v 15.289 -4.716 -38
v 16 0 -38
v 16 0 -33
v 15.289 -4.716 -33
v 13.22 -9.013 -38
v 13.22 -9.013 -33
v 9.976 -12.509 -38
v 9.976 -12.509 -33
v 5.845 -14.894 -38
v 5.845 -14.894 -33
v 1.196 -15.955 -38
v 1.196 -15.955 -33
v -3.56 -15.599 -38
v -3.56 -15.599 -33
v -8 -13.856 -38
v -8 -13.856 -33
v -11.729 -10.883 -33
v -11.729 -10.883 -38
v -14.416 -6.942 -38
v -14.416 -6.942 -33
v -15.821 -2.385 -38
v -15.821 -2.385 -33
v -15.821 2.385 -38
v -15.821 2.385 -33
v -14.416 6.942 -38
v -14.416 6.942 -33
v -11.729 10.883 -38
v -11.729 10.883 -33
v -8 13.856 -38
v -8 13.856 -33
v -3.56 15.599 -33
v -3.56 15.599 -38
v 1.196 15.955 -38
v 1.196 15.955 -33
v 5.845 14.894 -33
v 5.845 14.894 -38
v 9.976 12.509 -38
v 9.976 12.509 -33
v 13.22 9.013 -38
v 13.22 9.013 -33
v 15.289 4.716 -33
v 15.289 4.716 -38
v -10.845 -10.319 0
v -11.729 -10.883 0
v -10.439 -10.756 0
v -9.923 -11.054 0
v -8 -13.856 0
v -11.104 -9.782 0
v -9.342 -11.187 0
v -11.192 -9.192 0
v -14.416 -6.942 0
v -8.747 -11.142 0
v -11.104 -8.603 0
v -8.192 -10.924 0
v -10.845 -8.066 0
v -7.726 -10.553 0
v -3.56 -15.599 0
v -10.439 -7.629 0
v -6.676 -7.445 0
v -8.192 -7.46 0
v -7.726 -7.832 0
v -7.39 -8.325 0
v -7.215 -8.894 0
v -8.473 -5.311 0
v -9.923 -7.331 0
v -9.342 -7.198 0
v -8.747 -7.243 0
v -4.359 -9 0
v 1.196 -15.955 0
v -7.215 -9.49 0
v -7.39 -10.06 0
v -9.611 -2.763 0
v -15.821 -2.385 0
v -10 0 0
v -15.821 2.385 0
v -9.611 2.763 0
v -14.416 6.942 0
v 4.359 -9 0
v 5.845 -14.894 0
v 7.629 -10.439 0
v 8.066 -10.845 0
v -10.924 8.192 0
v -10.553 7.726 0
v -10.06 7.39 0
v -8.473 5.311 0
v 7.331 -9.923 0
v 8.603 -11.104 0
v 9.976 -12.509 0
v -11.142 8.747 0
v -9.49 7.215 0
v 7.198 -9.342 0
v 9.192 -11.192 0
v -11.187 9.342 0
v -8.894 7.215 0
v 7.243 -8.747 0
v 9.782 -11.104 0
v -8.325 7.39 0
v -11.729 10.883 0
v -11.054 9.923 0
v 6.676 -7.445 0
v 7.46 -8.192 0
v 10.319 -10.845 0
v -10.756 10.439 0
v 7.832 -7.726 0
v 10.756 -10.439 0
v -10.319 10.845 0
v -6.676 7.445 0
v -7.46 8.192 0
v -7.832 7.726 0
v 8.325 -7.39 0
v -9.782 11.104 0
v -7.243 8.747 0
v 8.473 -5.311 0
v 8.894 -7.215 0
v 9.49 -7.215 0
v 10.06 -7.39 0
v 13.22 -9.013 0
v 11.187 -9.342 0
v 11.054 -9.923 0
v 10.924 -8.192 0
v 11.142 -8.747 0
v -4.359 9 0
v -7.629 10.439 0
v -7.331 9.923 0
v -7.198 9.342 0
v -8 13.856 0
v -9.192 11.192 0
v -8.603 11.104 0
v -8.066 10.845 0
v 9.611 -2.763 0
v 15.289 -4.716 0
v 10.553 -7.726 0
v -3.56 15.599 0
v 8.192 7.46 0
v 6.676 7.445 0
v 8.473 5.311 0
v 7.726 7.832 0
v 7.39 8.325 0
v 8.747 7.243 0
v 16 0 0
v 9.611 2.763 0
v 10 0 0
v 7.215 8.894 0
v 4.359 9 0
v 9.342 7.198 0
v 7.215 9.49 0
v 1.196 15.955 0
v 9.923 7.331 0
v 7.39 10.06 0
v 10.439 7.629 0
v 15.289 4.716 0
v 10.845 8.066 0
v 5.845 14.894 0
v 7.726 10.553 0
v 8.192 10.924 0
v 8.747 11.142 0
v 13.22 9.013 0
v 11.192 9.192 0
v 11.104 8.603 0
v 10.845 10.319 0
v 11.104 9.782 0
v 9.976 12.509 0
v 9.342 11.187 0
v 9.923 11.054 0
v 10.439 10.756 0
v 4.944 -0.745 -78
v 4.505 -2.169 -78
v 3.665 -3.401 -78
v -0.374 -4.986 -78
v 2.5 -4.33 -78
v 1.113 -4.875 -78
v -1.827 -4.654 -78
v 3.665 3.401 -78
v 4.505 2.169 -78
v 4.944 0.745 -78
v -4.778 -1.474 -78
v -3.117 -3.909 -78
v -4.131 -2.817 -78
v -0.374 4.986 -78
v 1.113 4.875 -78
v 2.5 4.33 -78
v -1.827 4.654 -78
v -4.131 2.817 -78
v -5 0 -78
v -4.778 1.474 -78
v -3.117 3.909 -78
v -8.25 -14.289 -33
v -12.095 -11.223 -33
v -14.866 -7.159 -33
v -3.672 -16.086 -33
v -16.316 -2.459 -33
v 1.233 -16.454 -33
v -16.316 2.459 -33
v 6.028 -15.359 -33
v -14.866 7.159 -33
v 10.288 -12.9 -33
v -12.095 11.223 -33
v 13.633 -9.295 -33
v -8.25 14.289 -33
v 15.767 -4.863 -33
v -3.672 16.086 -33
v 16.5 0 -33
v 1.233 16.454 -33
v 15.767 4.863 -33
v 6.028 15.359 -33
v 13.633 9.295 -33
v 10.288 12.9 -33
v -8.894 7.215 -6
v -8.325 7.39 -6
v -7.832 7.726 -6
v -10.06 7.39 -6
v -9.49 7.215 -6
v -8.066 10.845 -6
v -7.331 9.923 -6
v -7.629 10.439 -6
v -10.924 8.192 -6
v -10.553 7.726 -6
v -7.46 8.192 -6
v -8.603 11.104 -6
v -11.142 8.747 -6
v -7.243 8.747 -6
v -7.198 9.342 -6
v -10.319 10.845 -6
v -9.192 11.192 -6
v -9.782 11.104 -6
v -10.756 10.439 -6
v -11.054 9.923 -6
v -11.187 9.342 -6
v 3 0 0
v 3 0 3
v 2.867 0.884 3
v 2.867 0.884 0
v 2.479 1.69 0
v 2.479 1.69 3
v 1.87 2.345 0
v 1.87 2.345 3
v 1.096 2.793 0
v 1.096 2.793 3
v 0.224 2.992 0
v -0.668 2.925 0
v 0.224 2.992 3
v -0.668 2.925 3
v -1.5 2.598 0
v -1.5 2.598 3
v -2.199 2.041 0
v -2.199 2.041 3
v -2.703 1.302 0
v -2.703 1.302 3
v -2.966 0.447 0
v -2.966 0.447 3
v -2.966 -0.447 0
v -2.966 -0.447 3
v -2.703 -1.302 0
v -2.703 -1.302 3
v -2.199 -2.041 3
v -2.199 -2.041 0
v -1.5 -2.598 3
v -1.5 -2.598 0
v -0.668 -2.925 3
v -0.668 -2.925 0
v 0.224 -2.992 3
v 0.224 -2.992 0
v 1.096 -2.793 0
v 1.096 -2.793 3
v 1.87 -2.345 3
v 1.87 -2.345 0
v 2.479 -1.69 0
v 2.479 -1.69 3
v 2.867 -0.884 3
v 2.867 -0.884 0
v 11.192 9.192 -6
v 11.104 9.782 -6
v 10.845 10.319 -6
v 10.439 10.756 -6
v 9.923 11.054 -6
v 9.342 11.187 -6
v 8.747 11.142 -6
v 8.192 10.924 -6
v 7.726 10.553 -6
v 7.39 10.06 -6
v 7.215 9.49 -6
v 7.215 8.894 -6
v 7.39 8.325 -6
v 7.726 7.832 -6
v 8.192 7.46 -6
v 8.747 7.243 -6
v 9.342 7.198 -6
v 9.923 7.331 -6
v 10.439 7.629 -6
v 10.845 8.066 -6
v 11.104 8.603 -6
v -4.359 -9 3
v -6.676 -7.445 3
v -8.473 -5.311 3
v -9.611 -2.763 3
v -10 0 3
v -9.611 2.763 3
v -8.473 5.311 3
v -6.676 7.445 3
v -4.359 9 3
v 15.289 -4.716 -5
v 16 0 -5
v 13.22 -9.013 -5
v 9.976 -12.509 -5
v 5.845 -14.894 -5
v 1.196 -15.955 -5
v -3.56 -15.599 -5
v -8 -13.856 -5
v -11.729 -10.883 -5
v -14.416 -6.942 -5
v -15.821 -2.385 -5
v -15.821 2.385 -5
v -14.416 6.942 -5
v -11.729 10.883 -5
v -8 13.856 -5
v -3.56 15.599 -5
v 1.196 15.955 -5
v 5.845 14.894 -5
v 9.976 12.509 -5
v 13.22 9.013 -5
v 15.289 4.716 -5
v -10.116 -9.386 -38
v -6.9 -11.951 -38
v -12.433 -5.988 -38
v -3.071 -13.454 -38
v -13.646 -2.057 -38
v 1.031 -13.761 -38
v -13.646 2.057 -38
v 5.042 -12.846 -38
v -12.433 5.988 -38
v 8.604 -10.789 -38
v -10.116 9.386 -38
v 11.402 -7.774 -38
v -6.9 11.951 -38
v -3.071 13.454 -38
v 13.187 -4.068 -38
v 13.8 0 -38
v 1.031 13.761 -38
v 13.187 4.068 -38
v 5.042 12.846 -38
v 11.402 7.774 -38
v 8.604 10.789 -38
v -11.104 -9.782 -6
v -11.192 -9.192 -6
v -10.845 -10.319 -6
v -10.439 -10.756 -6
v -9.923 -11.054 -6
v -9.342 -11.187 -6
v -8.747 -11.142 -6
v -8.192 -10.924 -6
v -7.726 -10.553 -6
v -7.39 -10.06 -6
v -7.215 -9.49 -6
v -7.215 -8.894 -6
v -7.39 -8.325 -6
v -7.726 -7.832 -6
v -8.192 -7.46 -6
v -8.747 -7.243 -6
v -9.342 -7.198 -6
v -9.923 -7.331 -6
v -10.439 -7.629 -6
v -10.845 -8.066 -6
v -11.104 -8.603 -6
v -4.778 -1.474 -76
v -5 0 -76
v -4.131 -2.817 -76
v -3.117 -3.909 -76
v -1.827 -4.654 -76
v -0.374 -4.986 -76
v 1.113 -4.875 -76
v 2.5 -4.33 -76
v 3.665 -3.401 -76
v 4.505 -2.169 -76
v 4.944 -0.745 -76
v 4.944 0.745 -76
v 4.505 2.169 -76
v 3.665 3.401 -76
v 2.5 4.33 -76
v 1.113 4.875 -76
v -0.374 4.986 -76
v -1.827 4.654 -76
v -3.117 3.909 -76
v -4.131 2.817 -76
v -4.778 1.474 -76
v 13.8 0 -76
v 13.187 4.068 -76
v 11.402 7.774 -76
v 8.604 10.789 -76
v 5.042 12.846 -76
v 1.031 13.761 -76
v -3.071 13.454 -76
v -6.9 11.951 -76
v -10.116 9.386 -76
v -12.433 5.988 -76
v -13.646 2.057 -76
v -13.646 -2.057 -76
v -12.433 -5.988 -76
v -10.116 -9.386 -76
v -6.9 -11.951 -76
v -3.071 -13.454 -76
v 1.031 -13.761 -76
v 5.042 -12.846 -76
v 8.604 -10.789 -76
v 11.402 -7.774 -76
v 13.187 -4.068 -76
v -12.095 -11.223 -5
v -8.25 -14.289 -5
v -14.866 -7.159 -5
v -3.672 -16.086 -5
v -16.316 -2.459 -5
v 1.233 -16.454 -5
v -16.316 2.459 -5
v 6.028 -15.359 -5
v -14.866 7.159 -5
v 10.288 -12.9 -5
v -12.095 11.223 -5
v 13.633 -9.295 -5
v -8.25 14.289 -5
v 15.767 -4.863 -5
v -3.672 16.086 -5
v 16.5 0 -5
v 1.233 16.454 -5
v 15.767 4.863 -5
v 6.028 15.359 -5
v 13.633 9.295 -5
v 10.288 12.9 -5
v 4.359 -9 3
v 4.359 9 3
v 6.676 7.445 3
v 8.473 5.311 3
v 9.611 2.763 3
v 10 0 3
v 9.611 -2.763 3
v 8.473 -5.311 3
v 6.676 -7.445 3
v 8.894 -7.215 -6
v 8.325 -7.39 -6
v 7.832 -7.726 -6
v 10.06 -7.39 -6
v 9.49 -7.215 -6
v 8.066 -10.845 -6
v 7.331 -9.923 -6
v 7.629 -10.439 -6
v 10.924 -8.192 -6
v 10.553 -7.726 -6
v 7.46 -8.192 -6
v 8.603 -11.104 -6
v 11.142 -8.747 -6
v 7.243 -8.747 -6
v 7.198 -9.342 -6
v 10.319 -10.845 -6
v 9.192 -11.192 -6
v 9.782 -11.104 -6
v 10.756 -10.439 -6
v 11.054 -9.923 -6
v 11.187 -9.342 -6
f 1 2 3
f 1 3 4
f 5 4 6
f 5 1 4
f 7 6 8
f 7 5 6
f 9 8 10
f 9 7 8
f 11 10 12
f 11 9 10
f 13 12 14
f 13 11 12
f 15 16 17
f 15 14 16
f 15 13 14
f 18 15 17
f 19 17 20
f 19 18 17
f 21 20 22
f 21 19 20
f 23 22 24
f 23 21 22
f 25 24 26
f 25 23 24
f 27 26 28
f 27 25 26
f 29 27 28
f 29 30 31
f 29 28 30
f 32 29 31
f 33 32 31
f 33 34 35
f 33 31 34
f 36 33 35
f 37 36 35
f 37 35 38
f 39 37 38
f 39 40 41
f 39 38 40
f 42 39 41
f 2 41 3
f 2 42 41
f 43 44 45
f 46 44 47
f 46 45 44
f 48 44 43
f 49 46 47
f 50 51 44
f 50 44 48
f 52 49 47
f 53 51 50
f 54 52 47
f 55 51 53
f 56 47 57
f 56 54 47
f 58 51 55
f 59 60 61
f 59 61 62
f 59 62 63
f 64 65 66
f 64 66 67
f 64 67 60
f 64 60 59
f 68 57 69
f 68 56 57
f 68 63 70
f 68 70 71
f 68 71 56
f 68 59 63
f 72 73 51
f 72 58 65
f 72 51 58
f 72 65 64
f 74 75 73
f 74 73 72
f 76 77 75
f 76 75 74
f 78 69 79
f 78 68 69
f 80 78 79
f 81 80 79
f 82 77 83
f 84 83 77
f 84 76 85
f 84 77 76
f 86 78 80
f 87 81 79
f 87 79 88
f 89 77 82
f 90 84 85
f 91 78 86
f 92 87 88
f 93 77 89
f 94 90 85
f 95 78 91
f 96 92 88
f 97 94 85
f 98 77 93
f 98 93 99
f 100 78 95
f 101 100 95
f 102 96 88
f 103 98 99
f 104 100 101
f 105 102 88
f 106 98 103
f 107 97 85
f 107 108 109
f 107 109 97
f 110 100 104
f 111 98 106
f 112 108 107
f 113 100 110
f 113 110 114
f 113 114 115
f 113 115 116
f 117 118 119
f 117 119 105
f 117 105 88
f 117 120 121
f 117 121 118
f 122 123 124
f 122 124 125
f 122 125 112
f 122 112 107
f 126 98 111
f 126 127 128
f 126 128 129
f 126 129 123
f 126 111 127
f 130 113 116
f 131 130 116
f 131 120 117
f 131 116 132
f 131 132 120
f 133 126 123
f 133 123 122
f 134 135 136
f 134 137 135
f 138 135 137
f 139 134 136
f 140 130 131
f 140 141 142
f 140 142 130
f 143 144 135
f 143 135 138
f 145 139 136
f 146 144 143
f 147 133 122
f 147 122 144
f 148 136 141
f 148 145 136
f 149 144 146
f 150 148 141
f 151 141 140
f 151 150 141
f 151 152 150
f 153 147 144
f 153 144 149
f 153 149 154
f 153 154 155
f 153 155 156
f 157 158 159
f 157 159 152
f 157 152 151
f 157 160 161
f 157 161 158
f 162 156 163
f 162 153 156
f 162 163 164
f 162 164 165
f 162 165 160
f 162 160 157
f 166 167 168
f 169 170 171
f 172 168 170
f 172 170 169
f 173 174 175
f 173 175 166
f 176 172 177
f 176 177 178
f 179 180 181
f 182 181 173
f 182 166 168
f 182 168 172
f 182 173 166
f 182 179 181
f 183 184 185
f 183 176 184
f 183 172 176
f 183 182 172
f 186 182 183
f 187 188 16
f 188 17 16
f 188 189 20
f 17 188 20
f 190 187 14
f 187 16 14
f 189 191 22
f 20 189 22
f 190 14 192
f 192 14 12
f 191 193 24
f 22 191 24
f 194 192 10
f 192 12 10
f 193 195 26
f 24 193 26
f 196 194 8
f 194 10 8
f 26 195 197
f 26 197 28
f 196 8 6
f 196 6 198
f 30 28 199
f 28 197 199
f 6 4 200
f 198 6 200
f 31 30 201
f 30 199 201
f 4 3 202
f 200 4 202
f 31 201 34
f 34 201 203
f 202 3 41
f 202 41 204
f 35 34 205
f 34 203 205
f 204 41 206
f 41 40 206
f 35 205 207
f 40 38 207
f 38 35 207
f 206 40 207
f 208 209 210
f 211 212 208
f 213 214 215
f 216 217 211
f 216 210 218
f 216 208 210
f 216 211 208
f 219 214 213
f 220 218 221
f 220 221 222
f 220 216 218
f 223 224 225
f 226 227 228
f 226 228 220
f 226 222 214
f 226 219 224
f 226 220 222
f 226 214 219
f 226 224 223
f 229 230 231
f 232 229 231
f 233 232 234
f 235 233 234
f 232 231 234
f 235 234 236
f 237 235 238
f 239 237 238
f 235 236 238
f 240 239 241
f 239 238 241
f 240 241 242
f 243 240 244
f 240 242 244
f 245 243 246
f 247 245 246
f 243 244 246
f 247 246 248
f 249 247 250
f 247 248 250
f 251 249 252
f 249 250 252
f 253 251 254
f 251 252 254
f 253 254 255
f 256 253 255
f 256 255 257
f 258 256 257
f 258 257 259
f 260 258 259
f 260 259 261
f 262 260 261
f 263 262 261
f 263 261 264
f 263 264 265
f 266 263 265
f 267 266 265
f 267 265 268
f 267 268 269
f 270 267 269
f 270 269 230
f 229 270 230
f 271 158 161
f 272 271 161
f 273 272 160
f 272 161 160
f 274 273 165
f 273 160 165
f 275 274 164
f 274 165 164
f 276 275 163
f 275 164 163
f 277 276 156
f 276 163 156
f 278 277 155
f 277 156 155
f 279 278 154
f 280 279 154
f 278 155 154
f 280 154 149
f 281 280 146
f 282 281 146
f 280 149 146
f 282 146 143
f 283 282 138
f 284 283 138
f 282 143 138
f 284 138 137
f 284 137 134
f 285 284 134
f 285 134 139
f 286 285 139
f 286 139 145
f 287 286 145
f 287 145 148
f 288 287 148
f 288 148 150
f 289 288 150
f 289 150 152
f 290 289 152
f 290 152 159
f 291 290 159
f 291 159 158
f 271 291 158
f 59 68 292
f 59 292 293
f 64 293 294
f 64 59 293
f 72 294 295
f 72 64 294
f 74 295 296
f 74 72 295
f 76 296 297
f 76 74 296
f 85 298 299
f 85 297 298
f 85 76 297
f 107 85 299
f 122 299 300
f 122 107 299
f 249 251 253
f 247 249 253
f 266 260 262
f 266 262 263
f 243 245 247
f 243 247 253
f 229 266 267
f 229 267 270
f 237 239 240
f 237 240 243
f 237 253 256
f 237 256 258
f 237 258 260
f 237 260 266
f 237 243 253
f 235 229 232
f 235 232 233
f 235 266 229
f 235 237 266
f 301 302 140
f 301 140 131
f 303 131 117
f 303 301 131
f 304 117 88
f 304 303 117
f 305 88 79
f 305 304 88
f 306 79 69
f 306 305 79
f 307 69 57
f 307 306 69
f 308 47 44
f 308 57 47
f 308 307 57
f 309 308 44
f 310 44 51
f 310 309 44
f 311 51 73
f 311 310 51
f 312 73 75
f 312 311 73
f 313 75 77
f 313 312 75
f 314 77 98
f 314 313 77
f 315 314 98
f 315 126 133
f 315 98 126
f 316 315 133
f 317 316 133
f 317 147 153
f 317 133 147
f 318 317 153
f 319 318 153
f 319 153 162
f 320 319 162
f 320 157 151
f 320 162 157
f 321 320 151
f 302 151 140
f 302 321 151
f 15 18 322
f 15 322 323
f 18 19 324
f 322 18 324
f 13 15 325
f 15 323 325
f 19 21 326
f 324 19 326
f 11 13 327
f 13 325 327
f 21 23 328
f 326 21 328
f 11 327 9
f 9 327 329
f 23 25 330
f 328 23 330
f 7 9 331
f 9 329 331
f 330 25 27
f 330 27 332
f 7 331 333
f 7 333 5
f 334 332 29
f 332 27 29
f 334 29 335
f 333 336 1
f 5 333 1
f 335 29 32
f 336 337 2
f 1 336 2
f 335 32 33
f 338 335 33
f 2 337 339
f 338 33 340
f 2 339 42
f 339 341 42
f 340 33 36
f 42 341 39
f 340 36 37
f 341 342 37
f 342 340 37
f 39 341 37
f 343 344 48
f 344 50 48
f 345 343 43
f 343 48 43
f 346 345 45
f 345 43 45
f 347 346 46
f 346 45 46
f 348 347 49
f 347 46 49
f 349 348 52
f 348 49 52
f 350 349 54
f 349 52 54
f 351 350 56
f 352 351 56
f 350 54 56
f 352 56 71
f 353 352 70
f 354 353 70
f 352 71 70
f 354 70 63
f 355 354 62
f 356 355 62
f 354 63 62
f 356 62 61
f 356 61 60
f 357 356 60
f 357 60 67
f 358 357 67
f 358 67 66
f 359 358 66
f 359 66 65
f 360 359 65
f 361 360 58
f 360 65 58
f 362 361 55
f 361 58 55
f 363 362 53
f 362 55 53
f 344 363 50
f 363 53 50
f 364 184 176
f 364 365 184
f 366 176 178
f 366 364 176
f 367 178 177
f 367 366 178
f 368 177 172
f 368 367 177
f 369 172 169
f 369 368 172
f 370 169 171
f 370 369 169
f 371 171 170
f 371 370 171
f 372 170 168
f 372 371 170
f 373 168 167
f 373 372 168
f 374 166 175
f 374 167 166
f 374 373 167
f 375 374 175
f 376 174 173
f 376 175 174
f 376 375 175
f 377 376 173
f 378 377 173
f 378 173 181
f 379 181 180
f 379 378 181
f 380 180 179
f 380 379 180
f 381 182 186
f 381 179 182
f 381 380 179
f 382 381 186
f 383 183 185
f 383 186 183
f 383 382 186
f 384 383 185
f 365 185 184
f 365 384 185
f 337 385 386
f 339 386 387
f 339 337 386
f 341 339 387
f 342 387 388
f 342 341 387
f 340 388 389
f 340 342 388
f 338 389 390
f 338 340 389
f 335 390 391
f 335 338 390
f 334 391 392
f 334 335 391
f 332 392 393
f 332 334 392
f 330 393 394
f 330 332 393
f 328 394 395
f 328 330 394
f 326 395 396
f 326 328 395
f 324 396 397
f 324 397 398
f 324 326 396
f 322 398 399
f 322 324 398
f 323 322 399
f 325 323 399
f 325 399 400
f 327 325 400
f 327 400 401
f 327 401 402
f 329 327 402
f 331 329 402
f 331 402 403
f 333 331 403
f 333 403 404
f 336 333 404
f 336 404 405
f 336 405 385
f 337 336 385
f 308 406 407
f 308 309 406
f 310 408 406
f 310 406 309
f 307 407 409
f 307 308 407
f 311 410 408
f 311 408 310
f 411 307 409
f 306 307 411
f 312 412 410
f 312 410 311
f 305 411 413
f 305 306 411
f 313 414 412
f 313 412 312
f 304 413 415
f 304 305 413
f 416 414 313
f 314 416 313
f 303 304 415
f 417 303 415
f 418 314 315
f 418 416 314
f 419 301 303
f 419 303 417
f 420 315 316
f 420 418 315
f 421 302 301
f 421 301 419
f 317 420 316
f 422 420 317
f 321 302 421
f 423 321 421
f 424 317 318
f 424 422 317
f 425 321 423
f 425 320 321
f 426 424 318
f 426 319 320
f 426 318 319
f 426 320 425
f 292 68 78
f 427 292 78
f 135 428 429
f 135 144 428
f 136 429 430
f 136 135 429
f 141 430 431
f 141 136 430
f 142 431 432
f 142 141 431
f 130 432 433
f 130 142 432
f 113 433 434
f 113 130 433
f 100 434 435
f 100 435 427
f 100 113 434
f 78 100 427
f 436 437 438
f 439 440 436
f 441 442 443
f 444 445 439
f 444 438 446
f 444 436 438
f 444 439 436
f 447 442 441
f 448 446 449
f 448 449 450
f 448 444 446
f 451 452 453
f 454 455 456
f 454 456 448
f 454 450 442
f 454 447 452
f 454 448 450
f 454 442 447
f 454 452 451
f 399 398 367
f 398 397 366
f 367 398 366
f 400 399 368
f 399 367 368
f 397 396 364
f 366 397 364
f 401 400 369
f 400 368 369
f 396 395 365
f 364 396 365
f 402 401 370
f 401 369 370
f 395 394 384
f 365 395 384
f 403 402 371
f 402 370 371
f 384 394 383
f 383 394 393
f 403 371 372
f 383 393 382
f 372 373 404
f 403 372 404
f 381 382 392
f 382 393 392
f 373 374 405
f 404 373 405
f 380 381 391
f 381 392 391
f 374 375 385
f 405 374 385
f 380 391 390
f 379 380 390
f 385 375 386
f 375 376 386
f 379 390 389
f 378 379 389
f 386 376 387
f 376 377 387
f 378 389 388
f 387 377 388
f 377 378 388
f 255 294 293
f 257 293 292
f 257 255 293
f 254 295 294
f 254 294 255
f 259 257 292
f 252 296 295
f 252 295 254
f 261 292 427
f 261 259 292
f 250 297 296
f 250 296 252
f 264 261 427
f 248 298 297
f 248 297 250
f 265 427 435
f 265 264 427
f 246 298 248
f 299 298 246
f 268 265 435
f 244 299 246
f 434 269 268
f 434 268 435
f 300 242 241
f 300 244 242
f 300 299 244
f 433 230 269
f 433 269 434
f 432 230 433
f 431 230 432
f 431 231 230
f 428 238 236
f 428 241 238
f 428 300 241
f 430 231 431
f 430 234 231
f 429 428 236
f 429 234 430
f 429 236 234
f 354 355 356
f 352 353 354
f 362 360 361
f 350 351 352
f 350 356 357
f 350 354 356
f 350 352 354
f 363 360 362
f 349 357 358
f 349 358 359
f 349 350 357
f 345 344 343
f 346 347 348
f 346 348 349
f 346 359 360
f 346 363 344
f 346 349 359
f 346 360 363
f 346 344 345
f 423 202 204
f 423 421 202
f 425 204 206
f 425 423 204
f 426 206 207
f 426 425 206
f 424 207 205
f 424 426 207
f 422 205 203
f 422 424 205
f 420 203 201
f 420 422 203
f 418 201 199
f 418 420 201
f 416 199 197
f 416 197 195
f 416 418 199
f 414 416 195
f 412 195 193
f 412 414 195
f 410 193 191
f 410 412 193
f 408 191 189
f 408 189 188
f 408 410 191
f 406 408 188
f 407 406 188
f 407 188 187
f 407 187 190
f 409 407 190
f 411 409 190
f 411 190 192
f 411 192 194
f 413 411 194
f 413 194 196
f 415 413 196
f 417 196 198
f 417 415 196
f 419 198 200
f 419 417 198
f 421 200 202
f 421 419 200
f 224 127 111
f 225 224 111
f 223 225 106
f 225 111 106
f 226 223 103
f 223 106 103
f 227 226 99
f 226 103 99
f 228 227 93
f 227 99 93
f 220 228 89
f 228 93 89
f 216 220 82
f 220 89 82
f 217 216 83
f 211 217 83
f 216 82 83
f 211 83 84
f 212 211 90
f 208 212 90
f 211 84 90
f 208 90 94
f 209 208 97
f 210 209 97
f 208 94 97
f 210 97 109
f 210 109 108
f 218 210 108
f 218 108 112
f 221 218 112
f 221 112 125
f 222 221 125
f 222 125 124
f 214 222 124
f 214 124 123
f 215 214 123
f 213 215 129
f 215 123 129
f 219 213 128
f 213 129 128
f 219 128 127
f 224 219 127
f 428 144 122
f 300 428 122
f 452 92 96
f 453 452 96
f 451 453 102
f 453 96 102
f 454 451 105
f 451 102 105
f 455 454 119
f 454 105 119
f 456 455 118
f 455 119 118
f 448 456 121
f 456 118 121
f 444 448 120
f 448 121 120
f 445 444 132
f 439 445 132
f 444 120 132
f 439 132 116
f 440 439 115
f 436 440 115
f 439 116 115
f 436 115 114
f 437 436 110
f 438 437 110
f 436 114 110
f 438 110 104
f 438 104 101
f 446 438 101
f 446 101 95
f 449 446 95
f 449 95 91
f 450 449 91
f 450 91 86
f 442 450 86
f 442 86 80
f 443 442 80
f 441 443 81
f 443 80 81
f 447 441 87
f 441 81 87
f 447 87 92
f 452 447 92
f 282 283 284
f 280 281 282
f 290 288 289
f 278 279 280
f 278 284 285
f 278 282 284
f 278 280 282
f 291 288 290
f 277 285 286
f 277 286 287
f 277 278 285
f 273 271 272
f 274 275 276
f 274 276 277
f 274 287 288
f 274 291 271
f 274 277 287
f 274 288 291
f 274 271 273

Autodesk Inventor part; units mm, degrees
sketch "Sketch1" plane through (0, 0, 0) normal (0, 0, 1) x (1, 0, 0)
  circle A0 centre (0, 0) radius 13.8
  dimension "d0" = 27.6
extrude "Extrusion1" add sketch "Sketch1" against normal blind 76
ref_plane "Work Plane1" through (0, 0, -38) normal (0, 0, 1) x (1, 0, 0)
sketch "Sketch2" plane through (0, 0, -38) normal (0, 0, 1) x (1, 0, 0)
  circle A0 centre (0, 0) radius 13.8 projected
  circle A1 centre (0, 0) radius 16
  dimension "d4" = 32
extrude "Extrusion2" add sketch "Sketch2" along normal blind 38
sketch "Sketch3" plane through (0, 0, -76) normal (0, 0, -1) x (-1, 0, 0)
  circle A0 centre (0, 0) radius 5
  dimension "d7" = 10
extrude "Extrusion3" add sketch "Sketch3" along normal blind 2
sketch "Sketch4" plane through (0, 0, 0) normal (0, 0, 1) x (1, 0, 0)
  circle A0 centre (0, 0) radius 5 projected
  circle A1 centre (0, 0) radius 10
  line L0 (-4.3589, -9) -> (4.3589, -9)
  line L1 (4.3589, -9) -> (4.3589, 9)
  line L2 (4.3589, 9) -> (-4.3589, 9)
  line L3 (-4.3589, 9) -> (-4.3589, -9)
  line L4 (-4.3589, -9) -> (4.3589, 9) construction
  line L5 (4.3589, -9) -> (-4.3589, 9) construction
  dimension "d10" = 20
  dimension "d11" = 18
extrude "Extrusion4" add sketch "Sketch4" along normal blind 3 contours A0 L1 | A0 L1 A1 | L1 A0 L3 | A0 L3 L2 L1 | L1 L0 L3 A0 | L3 A0 | A0 L3 A1
sketch "Sketch5" plane through (0, 0, 3) normal (0, 0, 1) x (1, 0, 0)
  circle A0 centre (0, 0) radius 3
  dimension "d14" = 6
extrude "Extrusion5" cut sketch "Sketch5" against normal blind 3
sketch "Sketch6" plane through (0, 0, 0) normal (0, 0, 1) x (1, 0, 0)
  circle A0 centre (0, 0) radius 3 projected
  circle A1 centre (0, 0) radius 13
  line L0 (0, 0) -> (9.1924, 9.1924)
  line L1 (0, 0) -> (13, 0) construction
  circle A2 centre (9.1924, 9.1924) radius 2
  dimension "d17" = 26
  dimension "d18" = 45
  dimension "d19" = 4
extrude "Extrusion6" cut sketch "Sketch6" against normal blind 6 contours A2 A1 L0 | L0 A1 A2 | A1 A2 picked at (9.9348, 9.3429)
pattern_circular "Circular Pattern1" count 4 over 360 about axis through (0, 0, -38) along (0, 0, 1) of "Extrusion6"
ref_plane "Work Plane2" through (0, 0, -5) normal (0, 0, 1) x (1, 0, 0)
ref_plane "Work Plane3" through (0, 0, -33) normal (0, 0, -1) x (-1, 0, 0)
sketch "Sketch7" plane through (0, 0, -5) normal (0, 0, 1) x (1, 0, 0)
  circle A0 centre (9.1924, -9.1924) radius 2 projected
  circle A1 centre (-9.1924, -9.1924) radius 2 projected
  circle A2 centre (-9.1924, 9.1924) radius 2 projected
  circle A3 centre (9.1924, 9.1924) radius 2 projected
  line L0 (4.3589, -9) -> (-4.3589, -9) projected
  arc A4 (-4.3589, 9) -> (-4.3589, -9) centre (0, 0) ccw projected
  line L1 (-4.3589, 9) -> (4.3589, 9) projected
  arc A5 (4.3589, -9) -> (4.3589, 9) centre (0, 0) ccw projected
  circle A6 centre (0, 0) radius 16 projected
  circle A7 centre (0, 0) radius 3 projected
  circle A8 centre (0, 0) radius 16.5
  dimension "d27" = 33
extrude "Extrusion7" add sketch "Sketch7" against normal up to surface (28 mm away) contours A8
thread "Thread1" size "M4x0.7" class "6H" standard "ANSI Metric M Profile" length 60
thread "Thread2" size "M4x0.7" class "6H" standard "ANSI Metric M Profile" length 60
thread "Thread3" size "M4x0.7" class "6H" standard "ANSI Metric M Profile" length 60
thread "Thread4" size "M4x0.7" class "6H" standard "ANSI Metric M Profile" length 60
properties part number "motor_body" material "Steel, Mild"
